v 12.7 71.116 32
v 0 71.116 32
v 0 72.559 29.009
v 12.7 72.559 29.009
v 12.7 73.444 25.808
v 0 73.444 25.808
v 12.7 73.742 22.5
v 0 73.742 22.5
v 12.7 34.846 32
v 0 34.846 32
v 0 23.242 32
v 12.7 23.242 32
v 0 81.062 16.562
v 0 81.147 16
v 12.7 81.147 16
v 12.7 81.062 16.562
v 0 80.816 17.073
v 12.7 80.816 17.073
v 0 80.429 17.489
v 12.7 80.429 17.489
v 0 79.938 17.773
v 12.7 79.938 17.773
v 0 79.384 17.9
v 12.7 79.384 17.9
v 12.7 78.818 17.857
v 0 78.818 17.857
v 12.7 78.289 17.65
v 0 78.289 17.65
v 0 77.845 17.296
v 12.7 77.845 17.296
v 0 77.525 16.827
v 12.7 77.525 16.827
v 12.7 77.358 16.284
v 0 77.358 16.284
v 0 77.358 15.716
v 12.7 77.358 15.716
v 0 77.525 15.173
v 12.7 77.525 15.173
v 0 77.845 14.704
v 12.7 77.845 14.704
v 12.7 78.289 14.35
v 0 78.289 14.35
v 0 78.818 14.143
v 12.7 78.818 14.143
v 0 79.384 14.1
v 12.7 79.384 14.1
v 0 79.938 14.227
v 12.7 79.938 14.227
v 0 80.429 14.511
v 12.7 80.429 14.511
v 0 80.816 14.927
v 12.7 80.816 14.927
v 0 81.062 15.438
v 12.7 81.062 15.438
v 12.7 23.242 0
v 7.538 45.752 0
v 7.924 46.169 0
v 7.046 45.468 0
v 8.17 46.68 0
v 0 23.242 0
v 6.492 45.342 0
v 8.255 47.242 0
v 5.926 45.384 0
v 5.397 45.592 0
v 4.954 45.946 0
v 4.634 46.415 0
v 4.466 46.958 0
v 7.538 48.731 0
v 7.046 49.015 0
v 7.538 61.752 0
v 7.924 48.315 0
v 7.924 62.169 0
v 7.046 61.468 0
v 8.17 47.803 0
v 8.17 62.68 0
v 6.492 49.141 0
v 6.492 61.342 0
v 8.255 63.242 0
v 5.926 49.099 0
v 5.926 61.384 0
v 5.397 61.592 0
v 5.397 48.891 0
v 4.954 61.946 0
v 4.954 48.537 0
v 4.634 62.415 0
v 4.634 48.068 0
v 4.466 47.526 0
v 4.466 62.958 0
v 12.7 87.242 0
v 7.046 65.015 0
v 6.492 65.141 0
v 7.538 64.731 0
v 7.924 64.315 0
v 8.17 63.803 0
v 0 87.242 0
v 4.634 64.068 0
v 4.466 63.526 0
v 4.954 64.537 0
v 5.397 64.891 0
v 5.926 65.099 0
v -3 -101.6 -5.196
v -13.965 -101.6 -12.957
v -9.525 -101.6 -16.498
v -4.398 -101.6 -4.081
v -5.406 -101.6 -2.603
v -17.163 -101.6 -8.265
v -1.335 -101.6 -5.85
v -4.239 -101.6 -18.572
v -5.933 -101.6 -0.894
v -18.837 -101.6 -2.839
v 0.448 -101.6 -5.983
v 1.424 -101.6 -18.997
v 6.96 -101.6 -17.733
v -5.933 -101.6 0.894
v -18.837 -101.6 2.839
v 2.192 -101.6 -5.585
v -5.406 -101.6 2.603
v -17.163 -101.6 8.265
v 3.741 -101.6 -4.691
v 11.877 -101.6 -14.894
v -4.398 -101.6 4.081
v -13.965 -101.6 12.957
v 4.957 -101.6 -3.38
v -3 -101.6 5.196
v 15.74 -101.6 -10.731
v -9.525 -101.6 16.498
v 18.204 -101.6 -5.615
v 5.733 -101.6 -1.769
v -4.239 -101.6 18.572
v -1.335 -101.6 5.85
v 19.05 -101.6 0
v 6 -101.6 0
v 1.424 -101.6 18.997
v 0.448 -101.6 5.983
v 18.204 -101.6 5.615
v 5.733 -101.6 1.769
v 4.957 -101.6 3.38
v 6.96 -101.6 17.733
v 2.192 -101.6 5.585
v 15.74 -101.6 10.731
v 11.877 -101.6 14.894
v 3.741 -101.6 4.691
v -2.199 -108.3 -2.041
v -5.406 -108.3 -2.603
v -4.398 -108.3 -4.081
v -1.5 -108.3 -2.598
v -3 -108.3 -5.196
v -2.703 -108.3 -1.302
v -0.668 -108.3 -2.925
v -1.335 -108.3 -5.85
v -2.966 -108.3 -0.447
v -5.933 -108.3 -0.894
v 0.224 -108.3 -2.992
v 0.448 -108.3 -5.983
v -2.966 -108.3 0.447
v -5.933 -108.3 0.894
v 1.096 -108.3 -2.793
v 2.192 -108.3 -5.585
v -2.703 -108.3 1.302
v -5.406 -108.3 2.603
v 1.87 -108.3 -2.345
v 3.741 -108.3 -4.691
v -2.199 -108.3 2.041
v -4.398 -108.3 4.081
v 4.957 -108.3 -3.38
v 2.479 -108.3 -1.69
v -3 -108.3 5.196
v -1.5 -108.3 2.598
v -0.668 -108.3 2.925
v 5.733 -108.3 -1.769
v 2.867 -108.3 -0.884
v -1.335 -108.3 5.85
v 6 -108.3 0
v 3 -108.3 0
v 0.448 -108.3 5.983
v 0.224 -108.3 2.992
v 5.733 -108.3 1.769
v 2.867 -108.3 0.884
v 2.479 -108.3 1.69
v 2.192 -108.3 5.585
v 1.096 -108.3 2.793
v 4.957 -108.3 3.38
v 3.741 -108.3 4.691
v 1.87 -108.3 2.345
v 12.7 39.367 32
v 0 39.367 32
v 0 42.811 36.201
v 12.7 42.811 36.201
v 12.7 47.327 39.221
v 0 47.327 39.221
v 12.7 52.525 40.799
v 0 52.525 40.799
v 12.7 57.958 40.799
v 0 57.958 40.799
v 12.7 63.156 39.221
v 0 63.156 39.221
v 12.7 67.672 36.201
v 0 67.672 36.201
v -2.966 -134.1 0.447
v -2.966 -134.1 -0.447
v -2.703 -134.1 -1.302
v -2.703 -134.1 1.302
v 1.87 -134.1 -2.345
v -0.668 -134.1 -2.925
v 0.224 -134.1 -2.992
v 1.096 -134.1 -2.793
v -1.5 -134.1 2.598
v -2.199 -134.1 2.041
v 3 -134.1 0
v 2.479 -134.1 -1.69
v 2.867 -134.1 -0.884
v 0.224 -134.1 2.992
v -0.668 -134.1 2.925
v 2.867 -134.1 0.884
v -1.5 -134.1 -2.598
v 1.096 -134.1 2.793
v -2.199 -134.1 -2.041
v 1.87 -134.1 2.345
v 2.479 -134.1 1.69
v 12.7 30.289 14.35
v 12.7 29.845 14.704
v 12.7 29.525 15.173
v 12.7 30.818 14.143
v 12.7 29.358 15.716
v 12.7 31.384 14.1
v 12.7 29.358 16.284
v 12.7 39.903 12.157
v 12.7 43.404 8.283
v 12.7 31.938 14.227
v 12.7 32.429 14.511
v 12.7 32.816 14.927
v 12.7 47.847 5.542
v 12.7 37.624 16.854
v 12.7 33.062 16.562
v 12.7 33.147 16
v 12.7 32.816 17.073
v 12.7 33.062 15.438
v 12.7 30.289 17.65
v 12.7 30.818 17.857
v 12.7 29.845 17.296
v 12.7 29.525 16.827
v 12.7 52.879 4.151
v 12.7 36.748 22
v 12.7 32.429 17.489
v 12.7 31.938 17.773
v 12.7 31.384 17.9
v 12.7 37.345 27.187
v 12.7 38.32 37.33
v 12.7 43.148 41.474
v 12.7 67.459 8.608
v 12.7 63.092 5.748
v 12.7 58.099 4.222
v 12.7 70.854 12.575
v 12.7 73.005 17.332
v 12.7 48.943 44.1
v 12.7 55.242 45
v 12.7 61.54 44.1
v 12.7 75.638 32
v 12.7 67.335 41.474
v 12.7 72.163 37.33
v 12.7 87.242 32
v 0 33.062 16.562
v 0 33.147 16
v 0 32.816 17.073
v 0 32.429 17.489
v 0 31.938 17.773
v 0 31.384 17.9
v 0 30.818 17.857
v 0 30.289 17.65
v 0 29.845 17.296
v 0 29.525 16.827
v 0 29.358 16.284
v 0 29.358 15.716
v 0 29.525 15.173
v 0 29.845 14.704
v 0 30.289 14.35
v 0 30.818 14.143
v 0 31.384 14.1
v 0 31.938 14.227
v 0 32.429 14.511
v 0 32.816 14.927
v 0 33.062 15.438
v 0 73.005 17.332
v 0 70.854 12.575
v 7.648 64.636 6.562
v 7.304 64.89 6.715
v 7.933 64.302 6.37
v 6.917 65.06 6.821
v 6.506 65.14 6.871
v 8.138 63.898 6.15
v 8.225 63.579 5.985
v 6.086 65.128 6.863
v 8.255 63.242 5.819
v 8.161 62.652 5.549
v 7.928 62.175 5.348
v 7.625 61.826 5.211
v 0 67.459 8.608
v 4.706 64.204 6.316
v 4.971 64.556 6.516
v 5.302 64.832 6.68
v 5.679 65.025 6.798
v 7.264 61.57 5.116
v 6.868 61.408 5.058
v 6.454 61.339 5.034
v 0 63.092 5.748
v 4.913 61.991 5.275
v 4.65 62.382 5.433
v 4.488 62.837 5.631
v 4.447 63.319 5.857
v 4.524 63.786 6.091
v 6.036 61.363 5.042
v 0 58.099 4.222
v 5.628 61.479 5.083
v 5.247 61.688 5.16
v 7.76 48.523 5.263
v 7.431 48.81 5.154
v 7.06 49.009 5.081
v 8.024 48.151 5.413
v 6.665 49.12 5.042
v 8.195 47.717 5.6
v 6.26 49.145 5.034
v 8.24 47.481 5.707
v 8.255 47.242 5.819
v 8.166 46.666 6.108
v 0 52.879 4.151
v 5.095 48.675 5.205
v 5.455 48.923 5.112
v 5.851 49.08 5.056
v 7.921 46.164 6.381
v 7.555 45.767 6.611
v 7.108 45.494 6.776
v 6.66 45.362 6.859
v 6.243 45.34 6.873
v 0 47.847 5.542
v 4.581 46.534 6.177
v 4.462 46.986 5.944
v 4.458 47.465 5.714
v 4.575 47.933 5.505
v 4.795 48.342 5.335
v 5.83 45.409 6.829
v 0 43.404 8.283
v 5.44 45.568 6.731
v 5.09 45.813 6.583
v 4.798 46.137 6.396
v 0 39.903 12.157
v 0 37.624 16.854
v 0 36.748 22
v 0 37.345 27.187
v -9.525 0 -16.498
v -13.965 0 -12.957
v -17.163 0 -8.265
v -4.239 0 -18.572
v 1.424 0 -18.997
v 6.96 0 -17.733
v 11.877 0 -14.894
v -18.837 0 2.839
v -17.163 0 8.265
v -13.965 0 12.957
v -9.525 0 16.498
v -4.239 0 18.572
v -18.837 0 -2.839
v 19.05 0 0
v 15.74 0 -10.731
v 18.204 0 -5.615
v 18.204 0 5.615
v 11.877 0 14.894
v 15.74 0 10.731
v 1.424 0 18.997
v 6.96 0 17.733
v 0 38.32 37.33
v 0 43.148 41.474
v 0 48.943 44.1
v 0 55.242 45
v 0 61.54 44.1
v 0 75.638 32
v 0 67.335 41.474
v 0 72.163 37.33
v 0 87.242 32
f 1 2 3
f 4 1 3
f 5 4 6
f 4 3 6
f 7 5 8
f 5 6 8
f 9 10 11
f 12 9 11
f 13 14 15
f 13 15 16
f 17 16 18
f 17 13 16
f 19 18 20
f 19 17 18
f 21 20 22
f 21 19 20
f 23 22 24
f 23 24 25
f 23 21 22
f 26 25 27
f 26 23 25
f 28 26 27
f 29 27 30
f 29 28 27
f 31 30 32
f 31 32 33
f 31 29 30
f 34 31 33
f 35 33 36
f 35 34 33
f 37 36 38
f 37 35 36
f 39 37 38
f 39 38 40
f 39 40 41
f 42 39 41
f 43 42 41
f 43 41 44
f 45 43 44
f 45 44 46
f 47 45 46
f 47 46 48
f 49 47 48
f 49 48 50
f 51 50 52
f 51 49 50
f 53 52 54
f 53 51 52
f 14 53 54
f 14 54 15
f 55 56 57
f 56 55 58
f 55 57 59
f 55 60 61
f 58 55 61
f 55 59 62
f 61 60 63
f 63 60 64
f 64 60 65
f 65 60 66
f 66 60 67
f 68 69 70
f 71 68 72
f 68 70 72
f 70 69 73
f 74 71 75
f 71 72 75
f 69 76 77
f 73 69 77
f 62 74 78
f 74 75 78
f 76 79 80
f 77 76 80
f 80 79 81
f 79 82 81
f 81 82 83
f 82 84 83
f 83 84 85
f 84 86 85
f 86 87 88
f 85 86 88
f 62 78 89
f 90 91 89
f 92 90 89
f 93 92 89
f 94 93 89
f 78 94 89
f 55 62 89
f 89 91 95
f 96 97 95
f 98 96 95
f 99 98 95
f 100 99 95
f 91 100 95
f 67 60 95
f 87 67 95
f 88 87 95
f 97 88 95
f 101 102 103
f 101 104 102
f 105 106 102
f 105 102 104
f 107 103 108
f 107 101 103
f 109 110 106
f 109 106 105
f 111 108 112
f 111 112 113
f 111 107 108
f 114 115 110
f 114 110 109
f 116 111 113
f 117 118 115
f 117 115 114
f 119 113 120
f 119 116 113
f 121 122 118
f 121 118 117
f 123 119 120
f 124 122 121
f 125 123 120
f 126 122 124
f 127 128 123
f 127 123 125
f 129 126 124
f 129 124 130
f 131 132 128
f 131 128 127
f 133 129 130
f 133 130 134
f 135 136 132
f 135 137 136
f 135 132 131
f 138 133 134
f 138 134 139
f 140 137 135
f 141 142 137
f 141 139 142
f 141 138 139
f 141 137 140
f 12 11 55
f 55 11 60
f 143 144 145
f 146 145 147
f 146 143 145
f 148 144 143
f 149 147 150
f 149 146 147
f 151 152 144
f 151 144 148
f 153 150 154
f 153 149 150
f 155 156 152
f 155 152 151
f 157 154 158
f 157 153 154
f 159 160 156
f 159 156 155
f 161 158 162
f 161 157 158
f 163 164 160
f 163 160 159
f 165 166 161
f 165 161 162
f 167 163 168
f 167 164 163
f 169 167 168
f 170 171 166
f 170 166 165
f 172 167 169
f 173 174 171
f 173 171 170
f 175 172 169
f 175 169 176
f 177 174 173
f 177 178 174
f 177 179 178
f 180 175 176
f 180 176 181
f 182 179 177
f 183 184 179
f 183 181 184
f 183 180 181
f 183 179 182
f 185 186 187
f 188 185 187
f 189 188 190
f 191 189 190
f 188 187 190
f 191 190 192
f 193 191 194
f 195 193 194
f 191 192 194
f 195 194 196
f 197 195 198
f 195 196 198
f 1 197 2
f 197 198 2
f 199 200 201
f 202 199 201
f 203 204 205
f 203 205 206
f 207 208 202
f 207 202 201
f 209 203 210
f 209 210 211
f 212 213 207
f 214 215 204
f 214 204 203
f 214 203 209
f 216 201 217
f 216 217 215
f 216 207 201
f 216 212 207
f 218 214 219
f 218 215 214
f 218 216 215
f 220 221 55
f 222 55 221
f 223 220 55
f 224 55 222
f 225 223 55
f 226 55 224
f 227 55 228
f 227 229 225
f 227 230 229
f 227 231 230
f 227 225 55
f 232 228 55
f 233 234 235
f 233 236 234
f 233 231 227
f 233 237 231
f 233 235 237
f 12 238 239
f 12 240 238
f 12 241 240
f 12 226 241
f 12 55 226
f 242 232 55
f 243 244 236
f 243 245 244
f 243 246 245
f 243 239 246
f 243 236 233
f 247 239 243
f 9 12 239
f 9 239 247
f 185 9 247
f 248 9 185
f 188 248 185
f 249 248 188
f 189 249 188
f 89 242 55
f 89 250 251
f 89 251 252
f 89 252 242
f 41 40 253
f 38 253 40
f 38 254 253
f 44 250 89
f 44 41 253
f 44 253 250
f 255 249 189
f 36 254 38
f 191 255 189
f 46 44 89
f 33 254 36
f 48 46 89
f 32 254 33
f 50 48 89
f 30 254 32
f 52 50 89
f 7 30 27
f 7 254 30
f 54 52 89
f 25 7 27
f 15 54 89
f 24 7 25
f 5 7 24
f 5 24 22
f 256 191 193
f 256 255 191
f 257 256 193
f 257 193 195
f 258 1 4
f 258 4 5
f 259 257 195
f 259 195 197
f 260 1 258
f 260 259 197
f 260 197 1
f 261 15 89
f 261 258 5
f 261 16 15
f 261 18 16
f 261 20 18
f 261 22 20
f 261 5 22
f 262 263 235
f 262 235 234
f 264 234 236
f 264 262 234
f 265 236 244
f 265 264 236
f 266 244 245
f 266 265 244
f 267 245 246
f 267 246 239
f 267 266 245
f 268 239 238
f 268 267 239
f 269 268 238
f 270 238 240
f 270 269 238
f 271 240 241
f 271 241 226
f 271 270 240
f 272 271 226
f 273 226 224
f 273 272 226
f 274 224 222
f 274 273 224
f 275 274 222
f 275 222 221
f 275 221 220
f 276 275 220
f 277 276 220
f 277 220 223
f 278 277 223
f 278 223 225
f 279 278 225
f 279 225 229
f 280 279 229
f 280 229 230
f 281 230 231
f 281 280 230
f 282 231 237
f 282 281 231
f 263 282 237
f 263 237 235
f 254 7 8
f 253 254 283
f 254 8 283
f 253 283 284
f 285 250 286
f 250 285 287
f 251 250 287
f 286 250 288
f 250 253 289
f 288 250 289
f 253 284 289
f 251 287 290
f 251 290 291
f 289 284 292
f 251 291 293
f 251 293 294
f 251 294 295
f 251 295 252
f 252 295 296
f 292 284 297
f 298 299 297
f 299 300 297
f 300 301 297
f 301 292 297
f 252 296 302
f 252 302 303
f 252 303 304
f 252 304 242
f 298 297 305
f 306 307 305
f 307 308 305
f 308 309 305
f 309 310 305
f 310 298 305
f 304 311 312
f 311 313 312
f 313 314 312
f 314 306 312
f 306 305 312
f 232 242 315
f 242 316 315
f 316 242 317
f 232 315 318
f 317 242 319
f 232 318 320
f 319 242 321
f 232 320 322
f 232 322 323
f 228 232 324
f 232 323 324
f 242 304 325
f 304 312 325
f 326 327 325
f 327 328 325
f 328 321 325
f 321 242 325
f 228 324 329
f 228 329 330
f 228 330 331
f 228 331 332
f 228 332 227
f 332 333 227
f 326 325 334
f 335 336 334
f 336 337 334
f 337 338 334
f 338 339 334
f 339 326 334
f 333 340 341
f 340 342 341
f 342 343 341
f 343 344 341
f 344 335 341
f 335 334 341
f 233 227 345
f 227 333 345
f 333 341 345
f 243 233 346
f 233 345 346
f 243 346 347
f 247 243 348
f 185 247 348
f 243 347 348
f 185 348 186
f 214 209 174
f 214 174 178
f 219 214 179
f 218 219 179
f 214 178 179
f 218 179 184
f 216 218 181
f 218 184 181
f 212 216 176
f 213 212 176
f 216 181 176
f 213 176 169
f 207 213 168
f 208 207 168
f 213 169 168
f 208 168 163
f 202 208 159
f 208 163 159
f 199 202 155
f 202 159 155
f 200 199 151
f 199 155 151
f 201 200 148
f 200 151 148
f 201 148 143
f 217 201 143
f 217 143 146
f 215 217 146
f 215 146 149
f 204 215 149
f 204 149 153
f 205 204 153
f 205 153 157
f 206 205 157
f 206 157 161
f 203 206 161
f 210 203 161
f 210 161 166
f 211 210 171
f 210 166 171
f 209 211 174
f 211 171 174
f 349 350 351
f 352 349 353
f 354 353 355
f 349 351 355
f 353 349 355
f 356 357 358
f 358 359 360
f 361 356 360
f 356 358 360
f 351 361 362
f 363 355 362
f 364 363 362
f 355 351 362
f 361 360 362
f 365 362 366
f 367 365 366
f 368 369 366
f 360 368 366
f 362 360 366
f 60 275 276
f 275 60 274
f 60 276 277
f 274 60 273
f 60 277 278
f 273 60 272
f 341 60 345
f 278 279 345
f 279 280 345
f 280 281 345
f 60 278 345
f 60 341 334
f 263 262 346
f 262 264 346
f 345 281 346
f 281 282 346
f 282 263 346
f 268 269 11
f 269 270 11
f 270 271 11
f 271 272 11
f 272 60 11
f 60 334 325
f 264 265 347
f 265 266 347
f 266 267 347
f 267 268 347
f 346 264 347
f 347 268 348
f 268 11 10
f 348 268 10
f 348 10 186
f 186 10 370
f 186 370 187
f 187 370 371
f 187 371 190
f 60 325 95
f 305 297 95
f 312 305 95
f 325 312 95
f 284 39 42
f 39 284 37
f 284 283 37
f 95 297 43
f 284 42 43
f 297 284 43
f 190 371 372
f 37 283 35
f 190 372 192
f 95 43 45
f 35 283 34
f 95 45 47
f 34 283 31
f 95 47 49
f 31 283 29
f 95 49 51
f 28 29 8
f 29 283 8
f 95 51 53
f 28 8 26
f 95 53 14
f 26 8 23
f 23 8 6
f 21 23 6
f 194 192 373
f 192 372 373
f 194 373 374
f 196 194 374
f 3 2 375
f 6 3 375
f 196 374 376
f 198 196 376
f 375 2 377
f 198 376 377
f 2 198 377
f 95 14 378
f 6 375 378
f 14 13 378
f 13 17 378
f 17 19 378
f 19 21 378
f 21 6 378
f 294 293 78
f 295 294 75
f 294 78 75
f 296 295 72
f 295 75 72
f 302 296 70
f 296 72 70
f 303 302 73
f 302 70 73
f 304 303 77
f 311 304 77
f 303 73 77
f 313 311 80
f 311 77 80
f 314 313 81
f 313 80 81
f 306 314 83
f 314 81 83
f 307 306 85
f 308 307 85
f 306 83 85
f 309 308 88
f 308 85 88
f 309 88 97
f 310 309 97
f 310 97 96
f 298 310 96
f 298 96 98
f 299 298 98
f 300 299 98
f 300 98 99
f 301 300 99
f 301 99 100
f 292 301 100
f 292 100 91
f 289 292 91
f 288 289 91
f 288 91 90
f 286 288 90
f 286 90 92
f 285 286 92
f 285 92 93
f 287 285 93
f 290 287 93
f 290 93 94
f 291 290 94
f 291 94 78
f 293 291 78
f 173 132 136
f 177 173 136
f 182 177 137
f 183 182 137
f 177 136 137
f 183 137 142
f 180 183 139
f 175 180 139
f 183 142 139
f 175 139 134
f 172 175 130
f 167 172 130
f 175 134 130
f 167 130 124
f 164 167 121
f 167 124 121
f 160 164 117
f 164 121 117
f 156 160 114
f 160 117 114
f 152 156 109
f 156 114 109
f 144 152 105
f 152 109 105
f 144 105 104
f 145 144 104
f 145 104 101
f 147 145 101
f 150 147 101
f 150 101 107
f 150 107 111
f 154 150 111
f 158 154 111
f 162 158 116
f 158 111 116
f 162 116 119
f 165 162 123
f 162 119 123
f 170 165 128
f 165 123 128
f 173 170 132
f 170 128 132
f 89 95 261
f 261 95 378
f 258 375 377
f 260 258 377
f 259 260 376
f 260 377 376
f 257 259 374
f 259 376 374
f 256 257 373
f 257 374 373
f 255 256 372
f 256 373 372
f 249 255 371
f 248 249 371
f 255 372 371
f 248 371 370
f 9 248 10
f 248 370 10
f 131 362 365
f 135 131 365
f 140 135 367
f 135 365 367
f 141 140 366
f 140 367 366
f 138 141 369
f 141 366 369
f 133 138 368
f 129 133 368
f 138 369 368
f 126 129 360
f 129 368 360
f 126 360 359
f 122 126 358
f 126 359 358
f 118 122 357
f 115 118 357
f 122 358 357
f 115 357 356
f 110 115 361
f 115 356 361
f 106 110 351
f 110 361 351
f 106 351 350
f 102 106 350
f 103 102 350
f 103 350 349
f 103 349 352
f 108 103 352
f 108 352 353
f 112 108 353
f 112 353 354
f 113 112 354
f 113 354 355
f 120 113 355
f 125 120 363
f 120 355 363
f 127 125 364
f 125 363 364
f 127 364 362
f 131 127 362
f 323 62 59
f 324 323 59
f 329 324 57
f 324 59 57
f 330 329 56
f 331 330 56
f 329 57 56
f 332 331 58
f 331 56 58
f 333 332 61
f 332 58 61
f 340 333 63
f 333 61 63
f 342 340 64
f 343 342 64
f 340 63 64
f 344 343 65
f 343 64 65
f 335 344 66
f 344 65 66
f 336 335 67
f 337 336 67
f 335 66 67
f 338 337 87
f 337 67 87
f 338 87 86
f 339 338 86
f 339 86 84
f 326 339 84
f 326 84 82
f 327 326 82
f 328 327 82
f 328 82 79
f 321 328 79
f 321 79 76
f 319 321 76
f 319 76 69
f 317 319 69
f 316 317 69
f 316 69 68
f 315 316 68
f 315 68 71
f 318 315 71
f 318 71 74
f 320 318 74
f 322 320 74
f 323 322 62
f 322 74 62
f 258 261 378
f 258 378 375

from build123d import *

# Parameters (mm, degrees)
F0_R     = 19.05
F1_DEPTH = 101.6
F2_R     = 6
F3_DEPTH = 6.7
F4_R     = 3
F5_DEPTH = 25.8
F6_R     = 1.905
F7_DEPTH = 12.7
F8_R     = 1.905
F9_DEPTH = 6.8759889051


with BuildPart() as f1:
    # F0 (on Front) → F1 (new body)
    with BuildSketch(Plane.XZ):
        Circle(F0_R)
    extrude(amount=F1_DEPTH)

    # F2 (on face) → F3 (join)
    with BuildSketch(Plane.XZ.offset(101.6)):
        Circle(F2_R)
    extrude(amount=F3_DEPTH)

    # F4 (on face) → F5 (join)
    with BuildSketch(Plane.XZ.offset(108.3)):
        Circle(F4_R)
    extrude(amount=F5_DEPTH)


with BuildPart() as f7:
    # F6 (on Right) → F7 (new body)
    with BuildSketch(Plane.YZ):
        with BuildLine():
            ThreePointArc((75.6377390228, 32), (55.2416609685, 45), (34.8455829141, 32))
            Line((34.8455829141, 32), (39.3671531021, 32))
            ThreePointArc((39.3671531021, 32), (55.2416609685, 41), (71.1161688348, 32))
            Line((71.1161688348, 32), (75.6377390228, 32))
        make_face()
        with BuildLine():
            ThreePointArc((34.8455829141, 32), (36.2679950074, 10.4066133776), (55.2416609685, 0))
            ThreePointArc((55.2416609685, 0), (71.1515635452, 6.5900974233), (77.7416609685, 22.5))
            ThreePointArc((77.7416609685, 22.5), (77.2093845217, 27.3650921768), (75.6377390228, 32))
            Line((75.6377390228, 32), (71.1161688348, 32))
            ThreePointArc((71.1161688348, 32), (73.0732115955, 27.4280627265), (73.7416609685, 22.5))
            ThreePointArc((73.7416609685, 22.5), (50.313598242, 4.668449373), (39.3671531021, 32))
            Line((39.3671531021, 32), (34.8455829141, 32))
        make_face()
        with BuildLine():
            Line((23.2416609685, 32), (23.2416609685, 0))
            Line((23.2416609685, 0), (55.2416609685, 0))
            ThreePointArc((55.2416609685, 0), (36.2679950074, 10.4066133776), (34.8455829141, 32))
            Line((34.8455829141, 32), (23.2416609685, 32))
        make_face()
        with Locations((31.2416609685, 16)):
            Circle(F6_R, mode=Mode.SUBTRACT)
        with BuildLine():
            ThreePointArc((77.7416609685, 22.5), (71.1515635452, 6.5900974233), (55.2416609685, 0))
            Line((55.2416609685, 0), (87.2416609685, 0))
            Line((87.2416609685, 0), (87.2416609685, 32))
            Line((87.2416609685, 32), (75.6377390228, 32))
            ThreePointArc((75.6377390228, 32), (77.2093845217, 27.3650921768), (77.7416609685, 22.5))
        make_face()
        with Locations((79.2416609685, 16)):
            Circle(F6_R, mode=Mode.SUBTRACT)
    extrude(amount=F7_DEPTH)

    # F8 (on face) → F9 (cut, through all)
    with BuildSketch(Plane(origin=(0, 0, 0), x_dir=(1, 0, 0), z_dir=(0, 0, -1))):
        with Locations((6.35, -47.2416609685)):
            Circle(F8_R)
        with Locations((6.35, -63.2416609685)):
            Circle(F8_R)
    extrude(amount=-F9_DEPTH, mode=Mode.SUBTRACT)


solid = Compound([f1.part, f7.part])
